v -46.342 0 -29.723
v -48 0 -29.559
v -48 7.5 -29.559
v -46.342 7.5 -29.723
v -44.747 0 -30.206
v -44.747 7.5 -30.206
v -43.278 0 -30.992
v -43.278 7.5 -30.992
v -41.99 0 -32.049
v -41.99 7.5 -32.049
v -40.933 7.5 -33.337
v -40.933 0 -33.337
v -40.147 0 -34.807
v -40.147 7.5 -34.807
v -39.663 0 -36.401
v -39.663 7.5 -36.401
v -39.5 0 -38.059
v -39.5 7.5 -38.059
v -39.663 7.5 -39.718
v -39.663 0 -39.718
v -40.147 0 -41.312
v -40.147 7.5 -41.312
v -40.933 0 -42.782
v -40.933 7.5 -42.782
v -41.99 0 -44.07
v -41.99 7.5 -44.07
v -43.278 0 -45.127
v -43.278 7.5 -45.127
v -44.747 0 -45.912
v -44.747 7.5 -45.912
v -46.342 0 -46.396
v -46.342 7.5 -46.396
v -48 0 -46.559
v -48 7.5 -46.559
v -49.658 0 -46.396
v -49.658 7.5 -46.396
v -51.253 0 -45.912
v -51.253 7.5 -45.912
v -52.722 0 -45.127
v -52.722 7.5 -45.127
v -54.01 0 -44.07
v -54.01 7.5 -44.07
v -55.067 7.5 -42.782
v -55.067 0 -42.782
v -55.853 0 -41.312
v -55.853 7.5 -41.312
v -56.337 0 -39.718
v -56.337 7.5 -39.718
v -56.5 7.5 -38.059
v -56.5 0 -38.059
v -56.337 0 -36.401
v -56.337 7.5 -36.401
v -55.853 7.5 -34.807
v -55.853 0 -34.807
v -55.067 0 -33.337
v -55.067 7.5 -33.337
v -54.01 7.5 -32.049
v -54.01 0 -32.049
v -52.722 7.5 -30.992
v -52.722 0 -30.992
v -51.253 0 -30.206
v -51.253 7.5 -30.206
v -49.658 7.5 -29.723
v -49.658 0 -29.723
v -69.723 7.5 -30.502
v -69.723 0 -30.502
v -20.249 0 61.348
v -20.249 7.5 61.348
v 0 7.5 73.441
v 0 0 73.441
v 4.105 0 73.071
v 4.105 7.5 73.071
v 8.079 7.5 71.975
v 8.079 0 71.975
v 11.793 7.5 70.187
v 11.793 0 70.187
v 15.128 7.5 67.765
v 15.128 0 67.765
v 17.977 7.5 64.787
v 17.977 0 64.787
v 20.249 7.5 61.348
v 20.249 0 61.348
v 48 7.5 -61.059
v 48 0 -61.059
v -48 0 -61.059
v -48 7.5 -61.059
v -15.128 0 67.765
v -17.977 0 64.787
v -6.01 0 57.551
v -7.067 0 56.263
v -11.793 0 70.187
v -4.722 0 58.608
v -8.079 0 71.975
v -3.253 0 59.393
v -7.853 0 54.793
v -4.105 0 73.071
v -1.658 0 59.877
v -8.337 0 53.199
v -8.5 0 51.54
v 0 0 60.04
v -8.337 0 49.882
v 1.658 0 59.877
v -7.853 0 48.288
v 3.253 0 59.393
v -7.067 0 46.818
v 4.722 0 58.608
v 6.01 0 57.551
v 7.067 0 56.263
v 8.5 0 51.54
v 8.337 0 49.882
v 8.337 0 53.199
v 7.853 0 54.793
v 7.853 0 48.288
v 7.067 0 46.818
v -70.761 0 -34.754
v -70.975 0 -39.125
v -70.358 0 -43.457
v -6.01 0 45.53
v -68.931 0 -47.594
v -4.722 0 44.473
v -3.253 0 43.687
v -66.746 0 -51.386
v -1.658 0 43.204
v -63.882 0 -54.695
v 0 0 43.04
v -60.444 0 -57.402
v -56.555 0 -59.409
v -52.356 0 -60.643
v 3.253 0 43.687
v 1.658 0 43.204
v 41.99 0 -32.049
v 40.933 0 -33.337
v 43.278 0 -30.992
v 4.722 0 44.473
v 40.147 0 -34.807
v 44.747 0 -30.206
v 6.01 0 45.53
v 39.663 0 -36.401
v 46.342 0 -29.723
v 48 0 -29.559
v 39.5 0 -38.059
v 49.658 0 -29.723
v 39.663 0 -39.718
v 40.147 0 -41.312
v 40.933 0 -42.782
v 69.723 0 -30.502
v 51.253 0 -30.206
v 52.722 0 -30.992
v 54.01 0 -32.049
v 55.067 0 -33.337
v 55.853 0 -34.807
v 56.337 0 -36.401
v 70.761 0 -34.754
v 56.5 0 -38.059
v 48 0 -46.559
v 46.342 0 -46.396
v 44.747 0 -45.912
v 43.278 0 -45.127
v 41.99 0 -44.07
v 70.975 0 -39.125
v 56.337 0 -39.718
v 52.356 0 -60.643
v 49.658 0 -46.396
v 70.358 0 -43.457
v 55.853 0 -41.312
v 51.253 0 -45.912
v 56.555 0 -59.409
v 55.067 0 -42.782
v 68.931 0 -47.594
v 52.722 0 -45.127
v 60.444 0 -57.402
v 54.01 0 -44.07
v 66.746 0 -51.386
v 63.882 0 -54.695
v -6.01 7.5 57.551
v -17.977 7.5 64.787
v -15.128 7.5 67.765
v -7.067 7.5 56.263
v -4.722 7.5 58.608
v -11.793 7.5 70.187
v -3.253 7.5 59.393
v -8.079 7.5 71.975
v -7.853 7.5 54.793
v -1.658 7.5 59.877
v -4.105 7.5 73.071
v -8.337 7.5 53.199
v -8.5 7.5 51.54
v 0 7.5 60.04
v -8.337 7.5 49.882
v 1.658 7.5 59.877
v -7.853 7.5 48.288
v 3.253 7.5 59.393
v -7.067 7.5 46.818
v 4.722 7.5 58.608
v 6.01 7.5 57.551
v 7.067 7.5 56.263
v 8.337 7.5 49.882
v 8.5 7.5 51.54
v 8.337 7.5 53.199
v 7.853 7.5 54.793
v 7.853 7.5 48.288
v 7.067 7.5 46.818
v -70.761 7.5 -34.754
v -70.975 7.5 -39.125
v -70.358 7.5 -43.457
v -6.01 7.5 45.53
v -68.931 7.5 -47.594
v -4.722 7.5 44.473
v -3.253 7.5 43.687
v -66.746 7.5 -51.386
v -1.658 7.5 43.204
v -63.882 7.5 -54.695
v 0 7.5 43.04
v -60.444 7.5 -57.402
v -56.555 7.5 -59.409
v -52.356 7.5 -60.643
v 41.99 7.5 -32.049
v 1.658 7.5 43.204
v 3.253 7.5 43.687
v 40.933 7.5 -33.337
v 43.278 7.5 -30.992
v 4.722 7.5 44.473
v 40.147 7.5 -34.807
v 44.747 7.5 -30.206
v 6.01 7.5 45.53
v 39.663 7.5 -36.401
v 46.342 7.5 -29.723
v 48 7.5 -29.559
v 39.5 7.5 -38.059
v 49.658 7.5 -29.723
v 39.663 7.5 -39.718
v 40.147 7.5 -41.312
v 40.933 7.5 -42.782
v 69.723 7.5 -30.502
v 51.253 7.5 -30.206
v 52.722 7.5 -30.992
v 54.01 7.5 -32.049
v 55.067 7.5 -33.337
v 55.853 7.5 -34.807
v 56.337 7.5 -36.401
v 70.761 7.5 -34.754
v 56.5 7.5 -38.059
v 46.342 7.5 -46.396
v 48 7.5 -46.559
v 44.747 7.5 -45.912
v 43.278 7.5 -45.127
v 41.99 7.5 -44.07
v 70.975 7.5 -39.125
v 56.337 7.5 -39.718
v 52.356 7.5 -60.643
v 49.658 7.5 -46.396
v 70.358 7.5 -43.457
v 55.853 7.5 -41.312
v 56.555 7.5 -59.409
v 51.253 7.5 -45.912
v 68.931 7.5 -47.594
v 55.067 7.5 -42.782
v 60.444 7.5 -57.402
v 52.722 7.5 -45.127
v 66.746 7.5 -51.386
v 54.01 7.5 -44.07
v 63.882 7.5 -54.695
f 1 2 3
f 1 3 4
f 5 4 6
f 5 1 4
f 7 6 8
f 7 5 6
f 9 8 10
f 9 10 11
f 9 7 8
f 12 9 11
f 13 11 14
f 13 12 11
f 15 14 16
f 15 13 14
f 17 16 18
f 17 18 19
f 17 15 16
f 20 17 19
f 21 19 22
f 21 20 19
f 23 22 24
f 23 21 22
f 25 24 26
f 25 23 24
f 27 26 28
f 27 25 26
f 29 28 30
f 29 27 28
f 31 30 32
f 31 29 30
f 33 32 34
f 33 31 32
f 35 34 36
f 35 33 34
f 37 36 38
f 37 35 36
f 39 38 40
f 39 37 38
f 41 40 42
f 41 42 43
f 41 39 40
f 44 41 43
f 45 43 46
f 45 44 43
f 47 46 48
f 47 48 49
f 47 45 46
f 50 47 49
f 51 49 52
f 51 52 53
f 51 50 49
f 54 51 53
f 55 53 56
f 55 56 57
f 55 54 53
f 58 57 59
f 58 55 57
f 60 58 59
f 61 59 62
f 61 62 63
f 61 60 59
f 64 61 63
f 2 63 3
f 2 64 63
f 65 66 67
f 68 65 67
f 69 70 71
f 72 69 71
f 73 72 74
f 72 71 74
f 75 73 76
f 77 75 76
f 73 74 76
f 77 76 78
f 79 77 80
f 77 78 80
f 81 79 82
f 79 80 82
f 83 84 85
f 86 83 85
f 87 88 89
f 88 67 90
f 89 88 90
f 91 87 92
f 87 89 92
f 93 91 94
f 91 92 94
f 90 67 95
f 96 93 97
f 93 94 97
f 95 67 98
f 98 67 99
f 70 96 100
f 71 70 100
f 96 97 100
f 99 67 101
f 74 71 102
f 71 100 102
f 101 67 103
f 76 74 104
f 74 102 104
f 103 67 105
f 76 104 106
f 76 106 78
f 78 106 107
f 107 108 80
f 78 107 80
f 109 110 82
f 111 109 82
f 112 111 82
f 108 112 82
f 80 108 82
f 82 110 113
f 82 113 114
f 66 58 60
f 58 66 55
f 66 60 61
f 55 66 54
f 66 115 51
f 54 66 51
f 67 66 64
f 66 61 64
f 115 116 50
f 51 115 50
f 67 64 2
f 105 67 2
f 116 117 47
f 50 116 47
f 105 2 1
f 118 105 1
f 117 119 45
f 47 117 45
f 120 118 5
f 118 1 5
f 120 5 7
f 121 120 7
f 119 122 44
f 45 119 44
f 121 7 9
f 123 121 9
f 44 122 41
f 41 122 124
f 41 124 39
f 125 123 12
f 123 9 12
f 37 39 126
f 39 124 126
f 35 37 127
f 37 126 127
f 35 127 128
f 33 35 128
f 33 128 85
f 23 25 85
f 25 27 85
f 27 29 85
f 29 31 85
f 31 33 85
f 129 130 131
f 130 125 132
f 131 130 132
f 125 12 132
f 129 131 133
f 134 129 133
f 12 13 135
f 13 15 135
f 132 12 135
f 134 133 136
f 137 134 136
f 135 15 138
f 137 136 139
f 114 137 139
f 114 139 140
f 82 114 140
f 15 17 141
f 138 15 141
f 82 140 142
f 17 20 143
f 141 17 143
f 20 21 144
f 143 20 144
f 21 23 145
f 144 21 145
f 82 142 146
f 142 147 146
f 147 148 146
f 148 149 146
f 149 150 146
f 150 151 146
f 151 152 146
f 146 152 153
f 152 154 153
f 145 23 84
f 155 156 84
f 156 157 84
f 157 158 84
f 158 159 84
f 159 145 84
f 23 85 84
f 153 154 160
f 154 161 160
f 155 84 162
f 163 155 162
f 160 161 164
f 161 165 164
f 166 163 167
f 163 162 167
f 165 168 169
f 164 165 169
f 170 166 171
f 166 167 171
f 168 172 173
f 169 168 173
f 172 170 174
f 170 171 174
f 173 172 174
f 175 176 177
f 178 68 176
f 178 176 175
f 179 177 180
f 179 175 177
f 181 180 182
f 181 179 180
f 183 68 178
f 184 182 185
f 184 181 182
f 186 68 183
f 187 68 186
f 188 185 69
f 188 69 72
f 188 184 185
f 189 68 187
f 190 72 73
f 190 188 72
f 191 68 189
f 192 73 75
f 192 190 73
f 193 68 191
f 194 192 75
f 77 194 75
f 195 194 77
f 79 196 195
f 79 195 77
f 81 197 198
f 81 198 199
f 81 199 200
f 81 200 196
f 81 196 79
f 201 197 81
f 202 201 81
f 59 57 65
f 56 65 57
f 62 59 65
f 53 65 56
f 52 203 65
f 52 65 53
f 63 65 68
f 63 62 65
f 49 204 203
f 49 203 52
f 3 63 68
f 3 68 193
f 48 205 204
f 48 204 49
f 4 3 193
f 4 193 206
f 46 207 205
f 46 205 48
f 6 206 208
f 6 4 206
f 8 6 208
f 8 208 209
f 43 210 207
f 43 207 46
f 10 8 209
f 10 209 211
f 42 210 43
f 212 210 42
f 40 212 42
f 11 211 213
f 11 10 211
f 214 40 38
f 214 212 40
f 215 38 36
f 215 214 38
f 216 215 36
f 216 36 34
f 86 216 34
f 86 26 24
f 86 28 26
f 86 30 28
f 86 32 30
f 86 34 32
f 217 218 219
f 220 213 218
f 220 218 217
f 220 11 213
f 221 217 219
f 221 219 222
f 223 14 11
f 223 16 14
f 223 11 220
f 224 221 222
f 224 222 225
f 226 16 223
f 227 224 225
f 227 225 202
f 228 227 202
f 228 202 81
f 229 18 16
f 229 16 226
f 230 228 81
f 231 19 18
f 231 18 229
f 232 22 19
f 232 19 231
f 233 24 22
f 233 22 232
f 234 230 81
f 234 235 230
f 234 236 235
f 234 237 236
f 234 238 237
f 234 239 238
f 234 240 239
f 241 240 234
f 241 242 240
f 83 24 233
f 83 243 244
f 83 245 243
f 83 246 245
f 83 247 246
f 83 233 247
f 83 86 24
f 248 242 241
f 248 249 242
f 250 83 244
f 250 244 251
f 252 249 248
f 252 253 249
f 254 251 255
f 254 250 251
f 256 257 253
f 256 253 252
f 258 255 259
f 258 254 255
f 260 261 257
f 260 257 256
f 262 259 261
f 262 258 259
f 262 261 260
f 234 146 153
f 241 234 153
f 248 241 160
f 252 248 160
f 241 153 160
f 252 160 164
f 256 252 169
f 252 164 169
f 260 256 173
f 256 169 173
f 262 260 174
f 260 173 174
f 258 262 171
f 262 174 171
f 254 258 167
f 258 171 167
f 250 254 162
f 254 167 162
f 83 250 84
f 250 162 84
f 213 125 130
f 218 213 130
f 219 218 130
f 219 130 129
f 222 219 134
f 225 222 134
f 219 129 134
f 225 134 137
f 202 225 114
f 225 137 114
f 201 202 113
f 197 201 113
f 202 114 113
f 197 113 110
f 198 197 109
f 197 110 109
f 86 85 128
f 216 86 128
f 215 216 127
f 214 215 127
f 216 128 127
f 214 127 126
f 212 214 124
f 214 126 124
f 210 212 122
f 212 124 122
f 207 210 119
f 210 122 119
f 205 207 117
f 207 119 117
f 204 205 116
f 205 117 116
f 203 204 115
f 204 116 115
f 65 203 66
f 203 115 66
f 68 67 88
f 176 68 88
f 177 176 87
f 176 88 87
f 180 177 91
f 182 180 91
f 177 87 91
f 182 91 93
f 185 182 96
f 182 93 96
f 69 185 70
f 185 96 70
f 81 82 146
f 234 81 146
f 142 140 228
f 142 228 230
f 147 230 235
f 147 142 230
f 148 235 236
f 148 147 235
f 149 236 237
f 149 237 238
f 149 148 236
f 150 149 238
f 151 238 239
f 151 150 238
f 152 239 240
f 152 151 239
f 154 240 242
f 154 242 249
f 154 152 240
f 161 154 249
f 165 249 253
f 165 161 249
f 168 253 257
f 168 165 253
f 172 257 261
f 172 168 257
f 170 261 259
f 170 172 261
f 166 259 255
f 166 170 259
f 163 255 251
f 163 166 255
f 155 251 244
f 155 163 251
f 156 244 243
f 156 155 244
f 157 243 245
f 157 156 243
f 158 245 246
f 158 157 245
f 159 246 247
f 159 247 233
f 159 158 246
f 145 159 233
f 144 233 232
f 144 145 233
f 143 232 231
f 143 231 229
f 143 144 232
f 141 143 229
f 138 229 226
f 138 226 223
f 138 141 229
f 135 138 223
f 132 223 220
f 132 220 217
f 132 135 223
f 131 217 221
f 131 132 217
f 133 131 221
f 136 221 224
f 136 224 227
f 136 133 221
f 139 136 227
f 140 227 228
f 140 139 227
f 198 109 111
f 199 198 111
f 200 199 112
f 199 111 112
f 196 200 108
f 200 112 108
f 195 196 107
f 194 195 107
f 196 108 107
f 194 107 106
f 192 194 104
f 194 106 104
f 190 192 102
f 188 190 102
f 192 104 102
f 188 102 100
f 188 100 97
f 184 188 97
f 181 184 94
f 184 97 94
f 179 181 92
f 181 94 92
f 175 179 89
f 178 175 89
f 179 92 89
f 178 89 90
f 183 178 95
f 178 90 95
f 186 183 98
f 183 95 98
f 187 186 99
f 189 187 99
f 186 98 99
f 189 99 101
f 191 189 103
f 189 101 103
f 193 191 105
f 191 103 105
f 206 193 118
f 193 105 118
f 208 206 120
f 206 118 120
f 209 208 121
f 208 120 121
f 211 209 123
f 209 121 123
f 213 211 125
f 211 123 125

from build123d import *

# Parameters (mm, degrees)
SKETCH2_R           = 8.5
BOSS_EXTRUDE1_DEPTH = 7.5


with BuildPart() as part:
    # Sketch2 → Boss-Extrude1 (new body)
    # profile 1 of 2: a face of its own
    with BuildSketch(Plane(origin=(0, 0, 0), x_dir=(1, 0, 0), z_dir=(0, 1, 0))):
        with BuildLine():
            Line((0, 61.059418618), (-48, 61.059418618))
            ThreePointArc((-48, 61.059418618), (-66.745837136, 51.385843122), (-69.723042032, 30.502339493))
            Line((-69.723042032, 30.502339493), (-20.24936145, -61.347614016))
            ThreePointArc((-20.24936145, -61.347614016), (-11.792757299, -70.18724883), (0, -73.440581382))
            Line((0, -73.440581382), (0, -60.040453624))
            ThreePointArc((0, -60.040453624), (-8.5, -51.540453624), (0, -43.040453624))
            Line((0, -43.040453624), (0, 61.059418618))
        make_face()
        with Locations(Location((-48, 38.059418618, 0), (0, 0, 270))):
            Circle(SKETCH2_R, mode=Mode.SUBTRACT)
    # profile 2 of 2: a face of its own
    with BuildSketch(Plane(origin=(0, 0, 0), x_dir=(1, 0, 0), z_dir=(0, 1, 0))):
        with BuildLine():
            Line((48, 61.059418618), (0, 61.059418618))
            Line((0, 61.059418618), (0, -43.040453624))
            ThreePointArc((0, -43.040453624), (6.01040764, -45.530045984), (8.5, -51.540453624))
            ThreePointArc((8.5, -51.540453624), (6.01040764, -57.550861264), (0, -60.040453624))
            Line((0, -60.040453624), (0, -73.440581382))
            ThreePointArc((0, -73.440581382), (11.792757299, -70.18724883), (20.24936145, -61.347614016))
            Line((20.24936145, -61.347614016), (69.723042032, 30.502339493))
            ThreePointArc((69.723042032, 30.502339493), (66.745837136, 51.385843122), (48, 61.059418618))
        make_face()
        with Locations(Location((48, 38.059418618, 0), (0, 0, 270))):
            Circle(SKETCH2_R, mode=Mode.SUBTRACT)
    extrude(amount=BOSS_EXTRUDE1_DEPTH)


solid = part.part
